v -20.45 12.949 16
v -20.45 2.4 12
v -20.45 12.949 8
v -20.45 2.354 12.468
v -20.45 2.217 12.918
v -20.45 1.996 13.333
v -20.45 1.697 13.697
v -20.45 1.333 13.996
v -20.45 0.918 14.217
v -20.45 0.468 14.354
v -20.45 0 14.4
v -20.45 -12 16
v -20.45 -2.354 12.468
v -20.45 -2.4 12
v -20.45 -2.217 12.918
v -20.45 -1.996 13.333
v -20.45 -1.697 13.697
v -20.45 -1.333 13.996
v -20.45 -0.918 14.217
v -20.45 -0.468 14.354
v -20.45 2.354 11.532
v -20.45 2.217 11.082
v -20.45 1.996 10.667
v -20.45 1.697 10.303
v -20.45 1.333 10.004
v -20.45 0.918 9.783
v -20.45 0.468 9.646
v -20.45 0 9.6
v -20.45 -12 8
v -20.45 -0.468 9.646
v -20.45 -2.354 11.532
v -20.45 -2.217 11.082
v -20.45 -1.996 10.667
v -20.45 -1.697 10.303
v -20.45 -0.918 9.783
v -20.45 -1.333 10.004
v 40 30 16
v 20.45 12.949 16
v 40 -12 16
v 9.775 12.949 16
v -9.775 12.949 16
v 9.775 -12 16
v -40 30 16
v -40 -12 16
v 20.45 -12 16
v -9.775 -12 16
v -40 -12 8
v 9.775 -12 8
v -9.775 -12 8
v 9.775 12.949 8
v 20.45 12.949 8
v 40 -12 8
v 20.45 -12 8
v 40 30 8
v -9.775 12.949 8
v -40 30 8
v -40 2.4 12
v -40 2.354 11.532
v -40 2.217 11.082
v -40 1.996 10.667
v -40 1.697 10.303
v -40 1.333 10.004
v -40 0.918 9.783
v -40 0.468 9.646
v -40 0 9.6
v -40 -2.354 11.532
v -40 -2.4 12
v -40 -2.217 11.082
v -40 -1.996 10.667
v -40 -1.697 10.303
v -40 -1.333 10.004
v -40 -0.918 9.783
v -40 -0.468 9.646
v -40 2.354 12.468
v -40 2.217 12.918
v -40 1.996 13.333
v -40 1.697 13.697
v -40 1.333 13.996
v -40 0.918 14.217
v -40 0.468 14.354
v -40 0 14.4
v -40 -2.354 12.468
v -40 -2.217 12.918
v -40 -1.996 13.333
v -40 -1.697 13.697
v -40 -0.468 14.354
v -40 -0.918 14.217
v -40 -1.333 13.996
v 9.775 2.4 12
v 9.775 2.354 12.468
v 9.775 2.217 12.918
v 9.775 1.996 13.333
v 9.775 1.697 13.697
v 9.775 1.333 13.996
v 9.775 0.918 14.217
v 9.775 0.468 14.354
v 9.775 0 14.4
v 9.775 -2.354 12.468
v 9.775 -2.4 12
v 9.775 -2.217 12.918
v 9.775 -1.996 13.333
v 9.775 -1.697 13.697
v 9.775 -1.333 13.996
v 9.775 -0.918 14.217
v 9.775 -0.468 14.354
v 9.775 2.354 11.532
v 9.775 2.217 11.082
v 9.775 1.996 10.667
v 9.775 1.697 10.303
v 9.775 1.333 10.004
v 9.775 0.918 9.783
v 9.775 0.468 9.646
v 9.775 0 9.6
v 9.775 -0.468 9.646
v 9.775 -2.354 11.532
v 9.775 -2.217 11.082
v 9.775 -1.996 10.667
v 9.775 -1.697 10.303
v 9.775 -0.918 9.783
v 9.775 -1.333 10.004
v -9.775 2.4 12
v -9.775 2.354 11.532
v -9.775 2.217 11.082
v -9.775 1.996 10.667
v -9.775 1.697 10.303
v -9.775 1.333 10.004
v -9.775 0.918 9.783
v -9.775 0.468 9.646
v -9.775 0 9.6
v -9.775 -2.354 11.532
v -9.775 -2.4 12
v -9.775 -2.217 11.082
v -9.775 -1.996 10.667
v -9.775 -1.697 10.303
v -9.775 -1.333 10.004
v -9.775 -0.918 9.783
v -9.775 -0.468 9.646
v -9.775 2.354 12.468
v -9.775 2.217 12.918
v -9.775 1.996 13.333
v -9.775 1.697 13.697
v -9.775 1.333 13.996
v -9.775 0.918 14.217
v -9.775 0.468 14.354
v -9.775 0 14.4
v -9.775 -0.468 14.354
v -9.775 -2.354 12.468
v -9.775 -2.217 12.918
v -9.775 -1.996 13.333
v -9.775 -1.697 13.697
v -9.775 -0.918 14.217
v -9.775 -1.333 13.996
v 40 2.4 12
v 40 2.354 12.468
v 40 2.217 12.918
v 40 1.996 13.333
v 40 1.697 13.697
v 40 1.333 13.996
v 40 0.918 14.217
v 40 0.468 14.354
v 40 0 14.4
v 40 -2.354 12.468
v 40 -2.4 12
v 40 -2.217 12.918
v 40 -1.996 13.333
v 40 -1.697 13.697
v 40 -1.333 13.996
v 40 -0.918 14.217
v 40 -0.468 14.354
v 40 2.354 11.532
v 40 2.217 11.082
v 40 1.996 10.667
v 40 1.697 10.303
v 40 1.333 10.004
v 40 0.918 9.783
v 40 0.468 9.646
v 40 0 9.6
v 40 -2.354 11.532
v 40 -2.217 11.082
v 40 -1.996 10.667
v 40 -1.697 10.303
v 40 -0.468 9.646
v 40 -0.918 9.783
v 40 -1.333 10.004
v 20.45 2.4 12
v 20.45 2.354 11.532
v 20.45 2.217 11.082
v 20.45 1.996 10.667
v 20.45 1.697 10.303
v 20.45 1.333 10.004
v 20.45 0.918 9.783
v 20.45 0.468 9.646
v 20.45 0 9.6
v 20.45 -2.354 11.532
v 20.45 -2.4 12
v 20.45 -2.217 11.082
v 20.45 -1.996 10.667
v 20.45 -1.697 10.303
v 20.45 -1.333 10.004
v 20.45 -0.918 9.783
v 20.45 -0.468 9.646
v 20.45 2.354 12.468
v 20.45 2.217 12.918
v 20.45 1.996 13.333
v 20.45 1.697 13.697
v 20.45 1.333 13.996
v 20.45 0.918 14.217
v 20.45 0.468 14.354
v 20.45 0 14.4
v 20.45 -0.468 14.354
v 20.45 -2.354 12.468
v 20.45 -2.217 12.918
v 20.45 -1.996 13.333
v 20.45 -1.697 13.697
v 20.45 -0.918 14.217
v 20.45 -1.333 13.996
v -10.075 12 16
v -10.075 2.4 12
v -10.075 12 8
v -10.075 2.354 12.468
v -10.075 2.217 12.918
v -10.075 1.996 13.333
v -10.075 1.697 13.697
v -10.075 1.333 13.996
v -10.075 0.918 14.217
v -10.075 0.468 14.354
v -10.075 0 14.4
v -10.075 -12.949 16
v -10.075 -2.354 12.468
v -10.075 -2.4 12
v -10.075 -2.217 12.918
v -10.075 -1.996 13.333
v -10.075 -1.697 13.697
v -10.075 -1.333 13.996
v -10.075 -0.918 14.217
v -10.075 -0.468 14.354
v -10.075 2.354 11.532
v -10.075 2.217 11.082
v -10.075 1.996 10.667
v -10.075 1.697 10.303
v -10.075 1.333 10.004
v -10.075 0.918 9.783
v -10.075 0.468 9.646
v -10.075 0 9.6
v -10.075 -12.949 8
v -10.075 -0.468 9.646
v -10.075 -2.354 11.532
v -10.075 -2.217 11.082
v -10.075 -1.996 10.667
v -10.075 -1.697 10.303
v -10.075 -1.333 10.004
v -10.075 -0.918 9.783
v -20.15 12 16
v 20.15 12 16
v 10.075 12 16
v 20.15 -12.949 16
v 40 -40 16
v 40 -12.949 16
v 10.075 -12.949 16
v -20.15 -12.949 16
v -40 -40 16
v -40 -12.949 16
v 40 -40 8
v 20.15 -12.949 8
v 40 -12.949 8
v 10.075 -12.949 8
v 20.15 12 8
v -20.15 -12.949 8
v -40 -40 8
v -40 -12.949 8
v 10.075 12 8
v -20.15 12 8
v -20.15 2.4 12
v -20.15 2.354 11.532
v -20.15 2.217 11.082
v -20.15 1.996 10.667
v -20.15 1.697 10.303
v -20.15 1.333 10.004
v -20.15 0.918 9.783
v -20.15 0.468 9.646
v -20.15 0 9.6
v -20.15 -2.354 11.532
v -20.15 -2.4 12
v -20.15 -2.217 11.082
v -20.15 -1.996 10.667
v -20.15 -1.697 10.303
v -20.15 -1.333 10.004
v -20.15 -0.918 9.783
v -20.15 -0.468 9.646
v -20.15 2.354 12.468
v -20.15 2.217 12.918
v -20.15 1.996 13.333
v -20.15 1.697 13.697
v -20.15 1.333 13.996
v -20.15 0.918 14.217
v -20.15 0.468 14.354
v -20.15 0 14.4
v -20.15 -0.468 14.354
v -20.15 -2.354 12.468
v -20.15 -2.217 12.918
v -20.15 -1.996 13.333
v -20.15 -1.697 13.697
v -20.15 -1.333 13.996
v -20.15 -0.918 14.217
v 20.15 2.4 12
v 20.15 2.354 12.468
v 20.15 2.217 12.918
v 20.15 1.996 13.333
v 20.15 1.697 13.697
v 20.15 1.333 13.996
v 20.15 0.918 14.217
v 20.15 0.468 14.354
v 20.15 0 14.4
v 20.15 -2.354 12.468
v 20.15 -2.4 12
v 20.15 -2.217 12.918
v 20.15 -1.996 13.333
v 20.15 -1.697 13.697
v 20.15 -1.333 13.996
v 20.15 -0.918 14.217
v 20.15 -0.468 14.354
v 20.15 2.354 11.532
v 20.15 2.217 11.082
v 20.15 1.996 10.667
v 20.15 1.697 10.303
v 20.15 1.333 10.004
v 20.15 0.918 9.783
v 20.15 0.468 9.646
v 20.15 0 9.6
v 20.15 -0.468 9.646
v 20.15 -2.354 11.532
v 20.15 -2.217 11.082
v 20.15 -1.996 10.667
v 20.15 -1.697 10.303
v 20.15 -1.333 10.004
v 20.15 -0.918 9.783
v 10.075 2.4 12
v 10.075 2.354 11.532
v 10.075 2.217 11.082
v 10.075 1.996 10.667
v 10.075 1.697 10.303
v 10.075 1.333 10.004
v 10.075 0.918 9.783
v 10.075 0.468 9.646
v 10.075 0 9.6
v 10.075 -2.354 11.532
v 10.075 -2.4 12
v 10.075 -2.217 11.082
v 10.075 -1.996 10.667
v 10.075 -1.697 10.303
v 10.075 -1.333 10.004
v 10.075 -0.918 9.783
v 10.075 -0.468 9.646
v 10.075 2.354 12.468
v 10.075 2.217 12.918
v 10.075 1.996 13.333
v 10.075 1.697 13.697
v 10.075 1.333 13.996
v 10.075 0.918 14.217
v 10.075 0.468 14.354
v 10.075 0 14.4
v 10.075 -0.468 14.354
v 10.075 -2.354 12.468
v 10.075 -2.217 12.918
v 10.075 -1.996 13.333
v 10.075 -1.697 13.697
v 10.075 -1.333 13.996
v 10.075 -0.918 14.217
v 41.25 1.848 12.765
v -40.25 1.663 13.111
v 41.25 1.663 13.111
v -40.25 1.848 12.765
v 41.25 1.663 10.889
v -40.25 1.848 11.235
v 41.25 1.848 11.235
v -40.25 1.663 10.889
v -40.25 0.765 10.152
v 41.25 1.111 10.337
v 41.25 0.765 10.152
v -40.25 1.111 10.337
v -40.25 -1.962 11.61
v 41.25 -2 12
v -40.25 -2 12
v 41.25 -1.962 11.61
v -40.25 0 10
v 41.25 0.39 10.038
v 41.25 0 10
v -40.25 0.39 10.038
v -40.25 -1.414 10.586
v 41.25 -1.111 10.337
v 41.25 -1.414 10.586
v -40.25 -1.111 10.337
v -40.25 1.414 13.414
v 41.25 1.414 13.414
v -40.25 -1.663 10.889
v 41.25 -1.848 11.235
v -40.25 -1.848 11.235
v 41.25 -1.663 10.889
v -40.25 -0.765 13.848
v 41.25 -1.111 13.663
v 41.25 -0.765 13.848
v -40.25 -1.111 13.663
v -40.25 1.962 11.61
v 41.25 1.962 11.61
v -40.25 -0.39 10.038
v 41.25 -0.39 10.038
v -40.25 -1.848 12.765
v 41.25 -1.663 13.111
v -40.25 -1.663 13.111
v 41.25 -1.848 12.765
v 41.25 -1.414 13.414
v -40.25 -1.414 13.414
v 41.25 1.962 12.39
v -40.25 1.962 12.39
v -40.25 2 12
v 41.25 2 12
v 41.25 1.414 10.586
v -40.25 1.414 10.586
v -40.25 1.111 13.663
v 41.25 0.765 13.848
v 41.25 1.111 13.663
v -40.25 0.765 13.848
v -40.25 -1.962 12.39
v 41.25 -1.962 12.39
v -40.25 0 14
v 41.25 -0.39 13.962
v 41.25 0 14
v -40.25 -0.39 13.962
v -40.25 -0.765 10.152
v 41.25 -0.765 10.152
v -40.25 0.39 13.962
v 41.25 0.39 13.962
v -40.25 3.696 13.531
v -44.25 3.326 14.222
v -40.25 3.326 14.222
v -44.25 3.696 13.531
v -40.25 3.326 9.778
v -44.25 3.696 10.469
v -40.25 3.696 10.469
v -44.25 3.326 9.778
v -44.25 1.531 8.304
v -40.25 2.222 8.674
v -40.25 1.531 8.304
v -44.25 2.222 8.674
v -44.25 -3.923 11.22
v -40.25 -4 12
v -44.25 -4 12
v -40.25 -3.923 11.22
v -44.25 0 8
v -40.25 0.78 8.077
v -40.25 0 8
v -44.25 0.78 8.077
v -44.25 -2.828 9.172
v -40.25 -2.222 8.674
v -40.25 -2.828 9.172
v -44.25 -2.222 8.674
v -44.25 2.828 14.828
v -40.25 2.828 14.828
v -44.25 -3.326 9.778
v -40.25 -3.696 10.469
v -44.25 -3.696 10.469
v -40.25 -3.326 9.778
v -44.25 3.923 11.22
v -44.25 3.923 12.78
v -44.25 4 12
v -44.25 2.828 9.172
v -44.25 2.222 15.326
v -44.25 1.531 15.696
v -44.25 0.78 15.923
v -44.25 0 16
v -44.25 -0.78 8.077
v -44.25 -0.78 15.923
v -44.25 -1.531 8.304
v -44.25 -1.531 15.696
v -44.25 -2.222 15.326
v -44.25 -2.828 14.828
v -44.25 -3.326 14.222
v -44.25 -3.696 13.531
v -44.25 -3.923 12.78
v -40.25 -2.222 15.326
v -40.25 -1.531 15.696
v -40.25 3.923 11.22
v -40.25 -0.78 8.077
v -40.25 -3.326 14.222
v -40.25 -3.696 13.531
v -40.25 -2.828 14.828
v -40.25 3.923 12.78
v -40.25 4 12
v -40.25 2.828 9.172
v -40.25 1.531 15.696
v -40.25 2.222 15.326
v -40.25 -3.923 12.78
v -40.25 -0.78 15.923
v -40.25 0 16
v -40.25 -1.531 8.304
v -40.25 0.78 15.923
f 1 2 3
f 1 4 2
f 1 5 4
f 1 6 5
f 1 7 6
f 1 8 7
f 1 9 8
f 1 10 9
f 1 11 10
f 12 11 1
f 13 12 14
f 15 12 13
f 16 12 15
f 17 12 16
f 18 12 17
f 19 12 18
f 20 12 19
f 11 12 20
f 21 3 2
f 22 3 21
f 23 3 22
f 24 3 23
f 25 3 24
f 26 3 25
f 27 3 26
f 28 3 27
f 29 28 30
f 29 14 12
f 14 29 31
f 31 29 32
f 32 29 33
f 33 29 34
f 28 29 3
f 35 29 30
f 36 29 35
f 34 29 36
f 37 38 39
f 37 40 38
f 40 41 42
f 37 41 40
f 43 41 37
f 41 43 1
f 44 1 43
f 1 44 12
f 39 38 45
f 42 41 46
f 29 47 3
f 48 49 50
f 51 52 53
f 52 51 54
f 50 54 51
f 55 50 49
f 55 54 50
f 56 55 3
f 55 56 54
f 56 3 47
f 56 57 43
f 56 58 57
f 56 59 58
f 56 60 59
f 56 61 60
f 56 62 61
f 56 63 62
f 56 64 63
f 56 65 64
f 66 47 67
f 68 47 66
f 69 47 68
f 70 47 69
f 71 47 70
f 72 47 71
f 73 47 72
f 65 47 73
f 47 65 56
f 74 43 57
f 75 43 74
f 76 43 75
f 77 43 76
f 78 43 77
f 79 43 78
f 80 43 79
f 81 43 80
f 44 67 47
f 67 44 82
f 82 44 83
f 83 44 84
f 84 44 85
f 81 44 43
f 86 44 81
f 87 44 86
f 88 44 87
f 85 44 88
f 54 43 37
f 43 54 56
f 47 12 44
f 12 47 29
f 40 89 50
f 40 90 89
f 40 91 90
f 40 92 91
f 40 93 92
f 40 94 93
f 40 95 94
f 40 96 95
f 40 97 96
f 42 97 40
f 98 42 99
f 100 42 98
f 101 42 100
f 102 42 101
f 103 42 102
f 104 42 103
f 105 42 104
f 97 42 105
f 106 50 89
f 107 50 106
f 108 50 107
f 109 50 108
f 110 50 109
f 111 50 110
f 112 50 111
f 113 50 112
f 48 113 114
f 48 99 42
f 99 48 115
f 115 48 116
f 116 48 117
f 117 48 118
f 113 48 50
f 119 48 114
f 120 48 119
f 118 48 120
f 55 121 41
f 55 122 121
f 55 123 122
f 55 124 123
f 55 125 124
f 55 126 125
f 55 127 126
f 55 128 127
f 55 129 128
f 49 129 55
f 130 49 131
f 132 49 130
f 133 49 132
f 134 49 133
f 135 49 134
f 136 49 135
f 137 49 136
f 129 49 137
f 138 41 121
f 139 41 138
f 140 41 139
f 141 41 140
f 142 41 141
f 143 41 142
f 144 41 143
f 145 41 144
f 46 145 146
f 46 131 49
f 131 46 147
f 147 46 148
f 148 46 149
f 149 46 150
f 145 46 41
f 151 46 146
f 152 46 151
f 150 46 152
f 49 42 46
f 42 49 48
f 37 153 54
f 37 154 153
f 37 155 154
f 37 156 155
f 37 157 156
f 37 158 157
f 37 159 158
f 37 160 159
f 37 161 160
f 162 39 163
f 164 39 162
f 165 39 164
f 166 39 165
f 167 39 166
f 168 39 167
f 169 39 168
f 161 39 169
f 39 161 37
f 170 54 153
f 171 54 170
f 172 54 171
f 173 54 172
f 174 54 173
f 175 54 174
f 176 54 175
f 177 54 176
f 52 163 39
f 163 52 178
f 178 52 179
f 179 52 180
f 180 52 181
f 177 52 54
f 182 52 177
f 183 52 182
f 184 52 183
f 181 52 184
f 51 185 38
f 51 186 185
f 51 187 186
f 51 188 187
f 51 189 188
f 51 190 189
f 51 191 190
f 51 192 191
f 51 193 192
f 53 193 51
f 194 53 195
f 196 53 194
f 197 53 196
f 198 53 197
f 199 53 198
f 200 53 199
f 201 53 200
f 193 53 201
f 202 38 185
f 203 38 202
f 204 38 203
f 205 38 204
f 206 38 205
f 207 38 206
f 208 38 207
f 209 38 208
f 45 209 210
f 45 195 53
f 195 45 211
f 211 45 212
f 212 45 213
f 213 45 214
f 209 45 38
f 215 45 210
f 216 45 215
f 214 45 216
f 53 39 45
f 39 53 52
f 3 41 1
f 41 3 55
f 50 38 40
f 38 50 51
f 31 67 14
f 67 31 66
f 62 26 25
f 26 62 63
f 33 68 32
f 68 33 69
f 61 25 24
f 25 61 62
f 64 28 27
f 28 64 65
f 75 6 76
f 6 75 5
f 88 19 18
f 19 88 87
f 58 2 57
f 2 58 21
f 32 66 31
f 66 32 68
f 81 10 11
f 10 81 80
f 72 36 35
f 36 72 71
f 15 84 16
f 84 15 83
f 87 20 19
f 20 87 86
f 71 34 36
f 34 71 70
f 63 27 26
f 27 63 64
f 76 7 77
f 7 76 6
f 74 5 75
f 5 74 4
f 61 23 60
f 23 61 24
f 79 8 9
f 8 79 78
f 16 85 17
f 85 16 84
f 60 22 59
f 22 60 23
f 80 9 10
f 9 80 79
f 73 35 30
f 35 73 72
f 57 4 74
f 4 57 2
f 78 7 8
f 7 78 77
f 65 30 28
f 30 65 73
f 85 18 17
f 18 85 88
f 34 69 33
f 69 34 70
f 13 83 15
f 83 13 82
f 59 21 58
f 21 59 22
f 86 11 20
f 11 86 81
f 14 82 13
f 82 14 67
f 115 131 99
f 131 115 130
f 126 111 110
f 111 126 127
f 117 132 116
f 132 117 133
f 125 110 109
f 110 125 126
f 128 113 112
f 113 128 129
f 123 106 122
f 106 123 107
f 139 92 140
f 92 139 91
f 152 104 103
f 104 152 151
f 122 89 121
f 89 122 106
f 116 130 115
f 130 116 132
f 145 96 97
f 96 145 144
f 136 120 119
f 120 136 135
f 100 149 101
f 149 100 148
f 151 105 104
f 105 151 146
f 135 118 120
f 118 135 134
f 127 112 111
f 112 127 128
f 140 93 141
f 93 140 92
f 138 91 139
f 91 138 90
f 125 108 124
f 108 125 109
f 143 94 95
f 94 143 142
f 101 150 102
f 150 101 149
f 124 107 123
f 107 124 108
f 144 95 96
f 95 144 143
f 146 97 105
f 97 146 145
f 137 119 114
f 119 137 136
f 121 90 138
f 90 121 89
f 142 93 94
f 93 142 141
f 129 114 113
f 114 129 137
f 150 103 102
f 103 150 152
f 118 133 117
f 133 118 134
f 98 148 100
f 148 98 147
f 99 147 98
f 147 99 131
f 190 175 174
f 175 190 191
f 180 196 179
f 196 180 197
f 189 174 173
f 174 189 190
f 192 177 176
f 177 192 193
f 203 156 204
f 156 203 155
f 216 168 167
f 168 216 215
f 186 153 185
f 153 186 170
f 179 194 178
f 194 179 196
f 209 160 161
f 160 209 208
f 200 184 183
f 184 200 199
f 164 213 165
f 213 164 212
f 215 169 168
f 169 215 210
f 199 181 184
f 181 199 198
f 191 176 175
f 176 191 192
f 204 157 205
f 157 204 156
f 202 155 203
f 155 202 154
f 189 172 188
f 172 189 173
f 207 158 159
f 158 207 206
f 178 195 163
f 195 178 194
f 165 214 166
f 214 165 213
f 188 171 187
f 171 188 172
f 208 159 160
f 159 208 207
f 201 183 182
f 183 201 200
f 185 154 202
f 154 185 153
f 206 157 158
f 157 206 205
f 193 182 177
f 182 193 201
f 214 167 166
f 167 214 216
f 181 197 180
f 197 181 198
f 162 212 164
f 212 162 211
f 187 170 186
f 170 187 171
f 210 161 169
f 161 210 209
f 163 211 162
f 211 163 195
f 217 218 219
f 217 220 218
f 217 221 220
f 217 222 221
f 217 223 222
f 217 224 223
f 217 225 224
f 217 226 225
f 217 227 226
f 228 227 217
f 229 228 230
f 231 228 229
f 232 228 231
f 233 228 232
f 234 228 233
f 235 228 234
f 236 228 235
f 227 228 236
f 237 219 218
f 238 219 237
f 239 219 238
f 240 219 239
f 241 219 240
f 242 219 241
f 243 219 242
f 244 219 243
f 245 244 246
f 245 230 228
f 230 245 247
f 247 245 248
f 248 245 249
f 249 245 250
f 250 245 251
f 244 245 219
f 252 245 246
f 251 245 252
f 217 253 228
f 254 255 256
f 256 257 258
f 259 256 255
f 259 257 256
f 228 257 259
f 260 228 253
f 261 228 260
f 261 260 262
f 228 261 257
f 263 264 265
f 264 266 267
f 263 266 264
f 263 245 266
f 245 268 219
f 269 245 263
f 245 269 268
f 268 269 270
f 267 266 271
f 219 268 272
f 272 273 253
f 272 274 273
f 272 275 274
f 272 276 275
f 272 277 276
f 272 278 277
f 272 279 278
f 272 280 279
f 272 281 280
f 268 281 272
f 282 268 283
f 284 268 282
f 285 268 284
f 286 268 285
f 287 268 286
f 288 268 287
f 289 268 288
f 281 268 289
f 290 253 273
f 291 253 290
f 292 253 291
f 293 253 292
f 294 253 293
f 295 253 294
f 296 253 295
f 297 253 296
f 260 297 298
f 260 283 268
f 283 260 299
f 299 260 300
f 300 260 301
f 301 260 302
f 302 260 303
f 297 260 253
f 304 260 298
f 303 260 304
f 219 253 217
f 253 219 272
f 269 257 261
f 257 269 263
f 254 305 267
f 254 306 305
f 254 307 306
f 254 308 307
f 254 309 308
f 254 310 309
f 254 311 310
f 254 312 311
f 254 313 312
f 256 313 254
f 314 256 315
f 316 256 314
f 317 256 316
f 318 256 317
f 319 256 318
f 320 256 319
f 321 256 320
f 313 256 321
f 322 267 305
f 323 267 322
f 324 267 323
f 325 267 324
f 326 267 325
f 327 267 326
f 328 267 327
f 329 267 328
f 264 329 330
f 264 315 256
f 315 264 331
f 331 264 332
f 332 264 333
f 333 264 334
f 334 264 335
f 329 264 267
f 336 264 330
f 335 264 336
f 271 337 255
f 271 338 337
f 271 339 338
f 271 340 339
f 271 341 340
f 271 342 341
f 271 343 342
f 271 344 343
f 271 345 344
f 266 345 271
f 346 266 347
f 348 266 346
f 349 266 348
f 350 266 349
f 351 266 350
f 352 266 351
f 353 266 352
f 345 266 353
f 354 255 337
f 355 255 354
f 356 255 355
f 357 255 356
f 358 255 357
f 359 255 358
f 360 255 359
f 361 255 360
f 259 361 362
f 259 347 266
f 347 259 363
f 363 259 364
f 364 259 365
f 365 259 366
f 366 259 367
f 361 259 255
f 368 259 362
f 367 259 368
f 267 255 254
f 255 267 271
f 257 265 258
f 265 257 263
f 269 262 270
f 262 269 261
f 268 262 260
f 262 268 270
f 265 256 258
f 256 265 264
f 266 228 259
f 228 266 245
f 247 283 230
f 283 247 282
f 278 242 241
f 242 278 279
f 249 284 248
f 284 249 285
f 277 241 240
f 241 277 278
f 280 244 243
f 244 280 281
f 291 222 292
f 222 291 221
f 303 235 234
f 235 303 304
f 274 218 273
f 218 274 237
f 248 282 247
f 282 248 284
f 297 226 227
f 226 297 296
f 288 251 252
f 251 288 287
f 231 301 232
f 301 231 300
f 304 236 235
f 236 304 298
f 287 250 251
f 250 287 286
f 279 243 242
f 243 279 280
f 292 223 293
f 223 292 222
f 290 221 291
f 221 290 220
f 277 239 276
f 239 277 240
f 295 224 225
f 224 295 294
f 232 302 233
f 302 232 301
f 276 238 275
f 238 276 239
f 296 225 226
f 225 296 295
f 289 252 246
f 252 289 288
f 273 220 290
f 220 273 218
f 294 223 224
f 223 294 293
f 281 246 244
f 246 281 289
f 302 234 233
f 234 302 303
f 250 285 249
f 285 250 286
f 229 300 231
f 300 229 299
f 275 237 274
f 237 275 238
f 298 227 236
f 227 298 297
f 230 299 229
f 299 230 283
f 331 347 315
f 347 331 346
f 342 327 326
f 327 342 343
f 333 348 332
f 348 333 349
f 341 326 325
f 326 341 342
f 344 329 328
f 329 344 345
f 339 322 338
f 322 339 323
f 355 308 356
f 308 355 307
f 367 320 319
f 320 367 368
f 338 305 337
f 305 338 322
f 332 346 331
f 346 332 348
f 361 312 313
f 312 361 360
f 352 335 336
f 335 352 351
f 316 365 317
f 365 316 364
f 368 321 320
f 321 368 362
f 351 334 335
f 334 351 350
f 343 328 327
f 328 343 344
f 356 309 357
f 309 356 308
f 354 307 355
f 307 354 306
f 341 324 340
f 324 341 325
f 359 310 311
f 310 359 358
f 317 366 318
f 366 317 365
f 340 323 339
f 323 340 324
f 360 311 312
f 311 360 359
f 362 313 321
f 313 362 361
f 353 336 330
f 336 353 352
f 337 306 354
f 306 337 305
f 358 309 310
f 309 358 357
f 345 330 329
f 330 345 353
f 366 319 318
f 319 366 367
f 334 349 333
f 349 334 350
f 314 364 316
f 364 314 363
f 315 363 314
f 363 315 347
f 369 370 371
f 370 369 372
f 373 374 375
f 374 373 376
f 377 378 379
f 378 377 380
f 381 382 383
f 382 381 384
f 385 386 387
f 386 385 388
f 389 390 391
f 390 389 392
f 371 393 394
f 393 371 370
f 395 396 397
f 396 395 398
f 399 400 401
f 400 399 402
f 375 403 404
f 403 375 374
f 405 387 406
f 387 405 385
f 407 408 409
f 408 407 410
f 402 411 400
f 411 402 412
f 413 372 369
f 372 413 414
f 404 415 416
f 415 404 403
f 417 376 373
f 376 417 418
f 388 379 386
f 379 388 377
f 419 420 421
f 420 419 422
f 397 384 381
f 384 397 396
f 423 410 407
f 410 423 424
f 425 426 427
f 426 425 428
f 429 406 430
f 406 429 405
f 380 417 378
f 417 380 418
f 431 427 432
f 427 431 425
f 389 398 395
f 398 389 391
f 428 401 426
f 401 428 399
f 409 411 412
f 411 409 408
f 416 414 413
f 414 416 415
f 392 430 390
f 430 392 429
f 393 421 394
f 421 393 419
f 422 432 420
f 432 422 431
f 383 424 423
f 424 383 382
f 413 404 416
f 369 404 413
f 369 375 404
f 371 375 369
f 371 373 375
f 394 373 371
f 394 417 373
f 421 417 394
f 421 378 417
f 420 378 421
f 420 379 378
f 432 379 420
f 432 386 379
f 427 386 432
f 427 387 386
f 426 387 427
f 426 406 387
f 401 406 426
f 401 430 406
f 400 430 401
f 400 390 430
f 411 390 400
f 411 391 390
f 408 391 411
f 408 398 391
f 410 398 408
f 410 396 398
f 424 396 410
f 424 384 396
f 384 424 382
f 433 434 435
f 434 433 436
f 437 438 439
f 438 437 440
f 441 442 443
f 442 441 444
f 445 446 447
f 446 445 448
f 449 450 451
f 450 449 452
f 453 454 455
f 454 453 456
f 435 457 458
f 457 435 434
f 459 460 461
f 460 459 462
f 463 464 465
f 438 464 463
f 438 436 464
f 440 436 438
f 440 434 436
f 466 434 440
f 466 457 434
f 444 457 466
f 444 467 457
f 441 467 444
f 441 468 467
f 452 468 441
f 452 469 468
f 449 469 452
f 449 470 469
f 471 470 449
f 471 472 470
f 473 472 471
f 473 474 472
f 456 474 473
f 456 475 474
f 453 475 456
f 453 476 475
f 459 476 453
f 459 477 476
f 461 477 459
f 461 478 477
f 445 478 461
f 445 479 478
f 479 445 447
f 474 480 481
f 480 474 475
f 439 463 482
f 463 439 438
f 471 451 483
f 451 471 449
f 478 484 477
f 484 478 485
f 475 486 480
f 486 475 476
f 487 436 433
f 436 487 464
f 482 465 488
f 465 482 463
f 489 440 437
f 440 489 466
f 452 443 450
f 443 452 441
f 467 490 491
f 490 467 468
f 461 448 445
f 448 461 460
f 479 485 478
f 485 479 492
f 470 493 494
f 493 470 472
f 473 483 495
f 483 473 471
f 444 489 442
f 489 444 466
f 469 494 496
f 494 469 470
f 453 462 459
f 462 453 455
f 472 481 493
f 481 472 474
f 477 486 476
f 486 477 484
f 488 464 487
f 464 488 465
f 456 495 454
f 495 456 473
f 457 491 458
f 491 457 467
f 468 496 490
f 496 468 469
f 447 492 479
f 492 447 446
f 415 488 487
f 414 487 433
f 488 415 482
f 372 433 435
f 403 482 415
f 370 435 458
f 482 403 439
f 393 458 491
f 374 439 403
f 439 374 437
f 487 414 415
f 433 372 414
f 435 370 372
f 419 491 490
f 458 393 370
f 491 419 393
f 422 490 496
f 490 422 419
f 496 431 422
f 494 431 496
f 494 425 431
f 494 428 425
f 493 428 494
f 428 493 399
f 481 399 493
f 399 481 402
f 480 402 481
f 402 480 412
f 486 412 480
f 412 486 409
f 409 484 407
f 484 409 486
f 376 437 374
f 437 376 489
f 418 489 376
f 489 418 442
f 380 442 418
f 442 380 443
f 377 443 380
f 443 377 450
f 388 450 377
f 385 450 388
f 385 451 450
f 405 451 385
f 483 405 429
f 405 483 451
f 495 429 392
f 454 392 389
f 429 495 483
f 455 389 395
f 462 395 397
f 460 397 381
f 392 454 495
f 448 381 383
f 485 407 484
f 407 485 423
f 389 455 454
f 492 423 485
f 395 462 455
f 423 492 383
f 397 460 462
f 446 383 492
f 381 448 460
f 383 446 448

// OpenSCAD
$fn = 32;

// ------------------------------------------------------------------------
// Butt hinge: hinge 80 mm, leaf swung 0 deg
// Every part is its own module, assembly() places every instance.
// ------------------------------------------------------------------------

// --- part 1 ---
module hinge_base() {
  difference() {
    union() {
      translate([-40, -12, -4]) cube([19.55, 42, 8]);
      translate([-9.775, -12, -4]) cube([19.55, 42, 8]);
      translate([20.45, -12, -4]) cube([19.55, 42, 8]);
      translate([-40, 12.949, -4]) cube([80, 17.051, 8]);
    }
    translate([-30.225, 0, 0]) rotate([0, 90, 0]) cylinder(h = 21.55, d = 4.8, center = true);
    translate([0, 0, 0]) rotate([0, 90, 0]) cylinder(h = 21.55, d = 4.8, center = true);
    translate([30.225, 0, 0]) rotate([0, 90, 0]) cylinder(h = 21.55, d = 4.8, center = true);
  }
}

// --- part 2 ---
module hinge_mover() {
  difference() {
    union() {
      translate([-20.15, -40, -4]) cube([10.075, 52, 8]);
      translate([10.075, -40, -4]) cube([10.075, 52, 8]);
      translate([-40, -40, -4]) cube([80, 27.051, 8]);
    }
    translate([-15.113, 0, 0]) rotate([0, 90, 0]) cylinder(h = 12.075, d = 4.8, center = true);
    translate([15.113, 0, 0]) rotate([0, 90, 0]) cylinder(h = 12.075, d = 4.8, center = true);
  }
}

// --- part 3 ---
module hinge_pin() {
  rotate([0, 90, 0]) cylinder(h = 82.5, d = 4, center = true);
  translate([-44.25, 0, 0]) rotate([0, 90, 0]) cylinder(h = 4, d = 8);
}

// --- assembly ---
module assembly() {
  color([0.80, 0.24, 0.20]) translate([0, 0, 12]) rotate([0, 0, 0]) hinge_base();
  color([0.20, 0.45, 0.75]) translate([0, 0, 12]) rotate([0, 0, 0]) hinge_mover();
  color([0.25, 0.62, 0.32]) translate([0, 0, 12]) rotate([0, 0, 0]) hinge_pin();
}

assembly();
